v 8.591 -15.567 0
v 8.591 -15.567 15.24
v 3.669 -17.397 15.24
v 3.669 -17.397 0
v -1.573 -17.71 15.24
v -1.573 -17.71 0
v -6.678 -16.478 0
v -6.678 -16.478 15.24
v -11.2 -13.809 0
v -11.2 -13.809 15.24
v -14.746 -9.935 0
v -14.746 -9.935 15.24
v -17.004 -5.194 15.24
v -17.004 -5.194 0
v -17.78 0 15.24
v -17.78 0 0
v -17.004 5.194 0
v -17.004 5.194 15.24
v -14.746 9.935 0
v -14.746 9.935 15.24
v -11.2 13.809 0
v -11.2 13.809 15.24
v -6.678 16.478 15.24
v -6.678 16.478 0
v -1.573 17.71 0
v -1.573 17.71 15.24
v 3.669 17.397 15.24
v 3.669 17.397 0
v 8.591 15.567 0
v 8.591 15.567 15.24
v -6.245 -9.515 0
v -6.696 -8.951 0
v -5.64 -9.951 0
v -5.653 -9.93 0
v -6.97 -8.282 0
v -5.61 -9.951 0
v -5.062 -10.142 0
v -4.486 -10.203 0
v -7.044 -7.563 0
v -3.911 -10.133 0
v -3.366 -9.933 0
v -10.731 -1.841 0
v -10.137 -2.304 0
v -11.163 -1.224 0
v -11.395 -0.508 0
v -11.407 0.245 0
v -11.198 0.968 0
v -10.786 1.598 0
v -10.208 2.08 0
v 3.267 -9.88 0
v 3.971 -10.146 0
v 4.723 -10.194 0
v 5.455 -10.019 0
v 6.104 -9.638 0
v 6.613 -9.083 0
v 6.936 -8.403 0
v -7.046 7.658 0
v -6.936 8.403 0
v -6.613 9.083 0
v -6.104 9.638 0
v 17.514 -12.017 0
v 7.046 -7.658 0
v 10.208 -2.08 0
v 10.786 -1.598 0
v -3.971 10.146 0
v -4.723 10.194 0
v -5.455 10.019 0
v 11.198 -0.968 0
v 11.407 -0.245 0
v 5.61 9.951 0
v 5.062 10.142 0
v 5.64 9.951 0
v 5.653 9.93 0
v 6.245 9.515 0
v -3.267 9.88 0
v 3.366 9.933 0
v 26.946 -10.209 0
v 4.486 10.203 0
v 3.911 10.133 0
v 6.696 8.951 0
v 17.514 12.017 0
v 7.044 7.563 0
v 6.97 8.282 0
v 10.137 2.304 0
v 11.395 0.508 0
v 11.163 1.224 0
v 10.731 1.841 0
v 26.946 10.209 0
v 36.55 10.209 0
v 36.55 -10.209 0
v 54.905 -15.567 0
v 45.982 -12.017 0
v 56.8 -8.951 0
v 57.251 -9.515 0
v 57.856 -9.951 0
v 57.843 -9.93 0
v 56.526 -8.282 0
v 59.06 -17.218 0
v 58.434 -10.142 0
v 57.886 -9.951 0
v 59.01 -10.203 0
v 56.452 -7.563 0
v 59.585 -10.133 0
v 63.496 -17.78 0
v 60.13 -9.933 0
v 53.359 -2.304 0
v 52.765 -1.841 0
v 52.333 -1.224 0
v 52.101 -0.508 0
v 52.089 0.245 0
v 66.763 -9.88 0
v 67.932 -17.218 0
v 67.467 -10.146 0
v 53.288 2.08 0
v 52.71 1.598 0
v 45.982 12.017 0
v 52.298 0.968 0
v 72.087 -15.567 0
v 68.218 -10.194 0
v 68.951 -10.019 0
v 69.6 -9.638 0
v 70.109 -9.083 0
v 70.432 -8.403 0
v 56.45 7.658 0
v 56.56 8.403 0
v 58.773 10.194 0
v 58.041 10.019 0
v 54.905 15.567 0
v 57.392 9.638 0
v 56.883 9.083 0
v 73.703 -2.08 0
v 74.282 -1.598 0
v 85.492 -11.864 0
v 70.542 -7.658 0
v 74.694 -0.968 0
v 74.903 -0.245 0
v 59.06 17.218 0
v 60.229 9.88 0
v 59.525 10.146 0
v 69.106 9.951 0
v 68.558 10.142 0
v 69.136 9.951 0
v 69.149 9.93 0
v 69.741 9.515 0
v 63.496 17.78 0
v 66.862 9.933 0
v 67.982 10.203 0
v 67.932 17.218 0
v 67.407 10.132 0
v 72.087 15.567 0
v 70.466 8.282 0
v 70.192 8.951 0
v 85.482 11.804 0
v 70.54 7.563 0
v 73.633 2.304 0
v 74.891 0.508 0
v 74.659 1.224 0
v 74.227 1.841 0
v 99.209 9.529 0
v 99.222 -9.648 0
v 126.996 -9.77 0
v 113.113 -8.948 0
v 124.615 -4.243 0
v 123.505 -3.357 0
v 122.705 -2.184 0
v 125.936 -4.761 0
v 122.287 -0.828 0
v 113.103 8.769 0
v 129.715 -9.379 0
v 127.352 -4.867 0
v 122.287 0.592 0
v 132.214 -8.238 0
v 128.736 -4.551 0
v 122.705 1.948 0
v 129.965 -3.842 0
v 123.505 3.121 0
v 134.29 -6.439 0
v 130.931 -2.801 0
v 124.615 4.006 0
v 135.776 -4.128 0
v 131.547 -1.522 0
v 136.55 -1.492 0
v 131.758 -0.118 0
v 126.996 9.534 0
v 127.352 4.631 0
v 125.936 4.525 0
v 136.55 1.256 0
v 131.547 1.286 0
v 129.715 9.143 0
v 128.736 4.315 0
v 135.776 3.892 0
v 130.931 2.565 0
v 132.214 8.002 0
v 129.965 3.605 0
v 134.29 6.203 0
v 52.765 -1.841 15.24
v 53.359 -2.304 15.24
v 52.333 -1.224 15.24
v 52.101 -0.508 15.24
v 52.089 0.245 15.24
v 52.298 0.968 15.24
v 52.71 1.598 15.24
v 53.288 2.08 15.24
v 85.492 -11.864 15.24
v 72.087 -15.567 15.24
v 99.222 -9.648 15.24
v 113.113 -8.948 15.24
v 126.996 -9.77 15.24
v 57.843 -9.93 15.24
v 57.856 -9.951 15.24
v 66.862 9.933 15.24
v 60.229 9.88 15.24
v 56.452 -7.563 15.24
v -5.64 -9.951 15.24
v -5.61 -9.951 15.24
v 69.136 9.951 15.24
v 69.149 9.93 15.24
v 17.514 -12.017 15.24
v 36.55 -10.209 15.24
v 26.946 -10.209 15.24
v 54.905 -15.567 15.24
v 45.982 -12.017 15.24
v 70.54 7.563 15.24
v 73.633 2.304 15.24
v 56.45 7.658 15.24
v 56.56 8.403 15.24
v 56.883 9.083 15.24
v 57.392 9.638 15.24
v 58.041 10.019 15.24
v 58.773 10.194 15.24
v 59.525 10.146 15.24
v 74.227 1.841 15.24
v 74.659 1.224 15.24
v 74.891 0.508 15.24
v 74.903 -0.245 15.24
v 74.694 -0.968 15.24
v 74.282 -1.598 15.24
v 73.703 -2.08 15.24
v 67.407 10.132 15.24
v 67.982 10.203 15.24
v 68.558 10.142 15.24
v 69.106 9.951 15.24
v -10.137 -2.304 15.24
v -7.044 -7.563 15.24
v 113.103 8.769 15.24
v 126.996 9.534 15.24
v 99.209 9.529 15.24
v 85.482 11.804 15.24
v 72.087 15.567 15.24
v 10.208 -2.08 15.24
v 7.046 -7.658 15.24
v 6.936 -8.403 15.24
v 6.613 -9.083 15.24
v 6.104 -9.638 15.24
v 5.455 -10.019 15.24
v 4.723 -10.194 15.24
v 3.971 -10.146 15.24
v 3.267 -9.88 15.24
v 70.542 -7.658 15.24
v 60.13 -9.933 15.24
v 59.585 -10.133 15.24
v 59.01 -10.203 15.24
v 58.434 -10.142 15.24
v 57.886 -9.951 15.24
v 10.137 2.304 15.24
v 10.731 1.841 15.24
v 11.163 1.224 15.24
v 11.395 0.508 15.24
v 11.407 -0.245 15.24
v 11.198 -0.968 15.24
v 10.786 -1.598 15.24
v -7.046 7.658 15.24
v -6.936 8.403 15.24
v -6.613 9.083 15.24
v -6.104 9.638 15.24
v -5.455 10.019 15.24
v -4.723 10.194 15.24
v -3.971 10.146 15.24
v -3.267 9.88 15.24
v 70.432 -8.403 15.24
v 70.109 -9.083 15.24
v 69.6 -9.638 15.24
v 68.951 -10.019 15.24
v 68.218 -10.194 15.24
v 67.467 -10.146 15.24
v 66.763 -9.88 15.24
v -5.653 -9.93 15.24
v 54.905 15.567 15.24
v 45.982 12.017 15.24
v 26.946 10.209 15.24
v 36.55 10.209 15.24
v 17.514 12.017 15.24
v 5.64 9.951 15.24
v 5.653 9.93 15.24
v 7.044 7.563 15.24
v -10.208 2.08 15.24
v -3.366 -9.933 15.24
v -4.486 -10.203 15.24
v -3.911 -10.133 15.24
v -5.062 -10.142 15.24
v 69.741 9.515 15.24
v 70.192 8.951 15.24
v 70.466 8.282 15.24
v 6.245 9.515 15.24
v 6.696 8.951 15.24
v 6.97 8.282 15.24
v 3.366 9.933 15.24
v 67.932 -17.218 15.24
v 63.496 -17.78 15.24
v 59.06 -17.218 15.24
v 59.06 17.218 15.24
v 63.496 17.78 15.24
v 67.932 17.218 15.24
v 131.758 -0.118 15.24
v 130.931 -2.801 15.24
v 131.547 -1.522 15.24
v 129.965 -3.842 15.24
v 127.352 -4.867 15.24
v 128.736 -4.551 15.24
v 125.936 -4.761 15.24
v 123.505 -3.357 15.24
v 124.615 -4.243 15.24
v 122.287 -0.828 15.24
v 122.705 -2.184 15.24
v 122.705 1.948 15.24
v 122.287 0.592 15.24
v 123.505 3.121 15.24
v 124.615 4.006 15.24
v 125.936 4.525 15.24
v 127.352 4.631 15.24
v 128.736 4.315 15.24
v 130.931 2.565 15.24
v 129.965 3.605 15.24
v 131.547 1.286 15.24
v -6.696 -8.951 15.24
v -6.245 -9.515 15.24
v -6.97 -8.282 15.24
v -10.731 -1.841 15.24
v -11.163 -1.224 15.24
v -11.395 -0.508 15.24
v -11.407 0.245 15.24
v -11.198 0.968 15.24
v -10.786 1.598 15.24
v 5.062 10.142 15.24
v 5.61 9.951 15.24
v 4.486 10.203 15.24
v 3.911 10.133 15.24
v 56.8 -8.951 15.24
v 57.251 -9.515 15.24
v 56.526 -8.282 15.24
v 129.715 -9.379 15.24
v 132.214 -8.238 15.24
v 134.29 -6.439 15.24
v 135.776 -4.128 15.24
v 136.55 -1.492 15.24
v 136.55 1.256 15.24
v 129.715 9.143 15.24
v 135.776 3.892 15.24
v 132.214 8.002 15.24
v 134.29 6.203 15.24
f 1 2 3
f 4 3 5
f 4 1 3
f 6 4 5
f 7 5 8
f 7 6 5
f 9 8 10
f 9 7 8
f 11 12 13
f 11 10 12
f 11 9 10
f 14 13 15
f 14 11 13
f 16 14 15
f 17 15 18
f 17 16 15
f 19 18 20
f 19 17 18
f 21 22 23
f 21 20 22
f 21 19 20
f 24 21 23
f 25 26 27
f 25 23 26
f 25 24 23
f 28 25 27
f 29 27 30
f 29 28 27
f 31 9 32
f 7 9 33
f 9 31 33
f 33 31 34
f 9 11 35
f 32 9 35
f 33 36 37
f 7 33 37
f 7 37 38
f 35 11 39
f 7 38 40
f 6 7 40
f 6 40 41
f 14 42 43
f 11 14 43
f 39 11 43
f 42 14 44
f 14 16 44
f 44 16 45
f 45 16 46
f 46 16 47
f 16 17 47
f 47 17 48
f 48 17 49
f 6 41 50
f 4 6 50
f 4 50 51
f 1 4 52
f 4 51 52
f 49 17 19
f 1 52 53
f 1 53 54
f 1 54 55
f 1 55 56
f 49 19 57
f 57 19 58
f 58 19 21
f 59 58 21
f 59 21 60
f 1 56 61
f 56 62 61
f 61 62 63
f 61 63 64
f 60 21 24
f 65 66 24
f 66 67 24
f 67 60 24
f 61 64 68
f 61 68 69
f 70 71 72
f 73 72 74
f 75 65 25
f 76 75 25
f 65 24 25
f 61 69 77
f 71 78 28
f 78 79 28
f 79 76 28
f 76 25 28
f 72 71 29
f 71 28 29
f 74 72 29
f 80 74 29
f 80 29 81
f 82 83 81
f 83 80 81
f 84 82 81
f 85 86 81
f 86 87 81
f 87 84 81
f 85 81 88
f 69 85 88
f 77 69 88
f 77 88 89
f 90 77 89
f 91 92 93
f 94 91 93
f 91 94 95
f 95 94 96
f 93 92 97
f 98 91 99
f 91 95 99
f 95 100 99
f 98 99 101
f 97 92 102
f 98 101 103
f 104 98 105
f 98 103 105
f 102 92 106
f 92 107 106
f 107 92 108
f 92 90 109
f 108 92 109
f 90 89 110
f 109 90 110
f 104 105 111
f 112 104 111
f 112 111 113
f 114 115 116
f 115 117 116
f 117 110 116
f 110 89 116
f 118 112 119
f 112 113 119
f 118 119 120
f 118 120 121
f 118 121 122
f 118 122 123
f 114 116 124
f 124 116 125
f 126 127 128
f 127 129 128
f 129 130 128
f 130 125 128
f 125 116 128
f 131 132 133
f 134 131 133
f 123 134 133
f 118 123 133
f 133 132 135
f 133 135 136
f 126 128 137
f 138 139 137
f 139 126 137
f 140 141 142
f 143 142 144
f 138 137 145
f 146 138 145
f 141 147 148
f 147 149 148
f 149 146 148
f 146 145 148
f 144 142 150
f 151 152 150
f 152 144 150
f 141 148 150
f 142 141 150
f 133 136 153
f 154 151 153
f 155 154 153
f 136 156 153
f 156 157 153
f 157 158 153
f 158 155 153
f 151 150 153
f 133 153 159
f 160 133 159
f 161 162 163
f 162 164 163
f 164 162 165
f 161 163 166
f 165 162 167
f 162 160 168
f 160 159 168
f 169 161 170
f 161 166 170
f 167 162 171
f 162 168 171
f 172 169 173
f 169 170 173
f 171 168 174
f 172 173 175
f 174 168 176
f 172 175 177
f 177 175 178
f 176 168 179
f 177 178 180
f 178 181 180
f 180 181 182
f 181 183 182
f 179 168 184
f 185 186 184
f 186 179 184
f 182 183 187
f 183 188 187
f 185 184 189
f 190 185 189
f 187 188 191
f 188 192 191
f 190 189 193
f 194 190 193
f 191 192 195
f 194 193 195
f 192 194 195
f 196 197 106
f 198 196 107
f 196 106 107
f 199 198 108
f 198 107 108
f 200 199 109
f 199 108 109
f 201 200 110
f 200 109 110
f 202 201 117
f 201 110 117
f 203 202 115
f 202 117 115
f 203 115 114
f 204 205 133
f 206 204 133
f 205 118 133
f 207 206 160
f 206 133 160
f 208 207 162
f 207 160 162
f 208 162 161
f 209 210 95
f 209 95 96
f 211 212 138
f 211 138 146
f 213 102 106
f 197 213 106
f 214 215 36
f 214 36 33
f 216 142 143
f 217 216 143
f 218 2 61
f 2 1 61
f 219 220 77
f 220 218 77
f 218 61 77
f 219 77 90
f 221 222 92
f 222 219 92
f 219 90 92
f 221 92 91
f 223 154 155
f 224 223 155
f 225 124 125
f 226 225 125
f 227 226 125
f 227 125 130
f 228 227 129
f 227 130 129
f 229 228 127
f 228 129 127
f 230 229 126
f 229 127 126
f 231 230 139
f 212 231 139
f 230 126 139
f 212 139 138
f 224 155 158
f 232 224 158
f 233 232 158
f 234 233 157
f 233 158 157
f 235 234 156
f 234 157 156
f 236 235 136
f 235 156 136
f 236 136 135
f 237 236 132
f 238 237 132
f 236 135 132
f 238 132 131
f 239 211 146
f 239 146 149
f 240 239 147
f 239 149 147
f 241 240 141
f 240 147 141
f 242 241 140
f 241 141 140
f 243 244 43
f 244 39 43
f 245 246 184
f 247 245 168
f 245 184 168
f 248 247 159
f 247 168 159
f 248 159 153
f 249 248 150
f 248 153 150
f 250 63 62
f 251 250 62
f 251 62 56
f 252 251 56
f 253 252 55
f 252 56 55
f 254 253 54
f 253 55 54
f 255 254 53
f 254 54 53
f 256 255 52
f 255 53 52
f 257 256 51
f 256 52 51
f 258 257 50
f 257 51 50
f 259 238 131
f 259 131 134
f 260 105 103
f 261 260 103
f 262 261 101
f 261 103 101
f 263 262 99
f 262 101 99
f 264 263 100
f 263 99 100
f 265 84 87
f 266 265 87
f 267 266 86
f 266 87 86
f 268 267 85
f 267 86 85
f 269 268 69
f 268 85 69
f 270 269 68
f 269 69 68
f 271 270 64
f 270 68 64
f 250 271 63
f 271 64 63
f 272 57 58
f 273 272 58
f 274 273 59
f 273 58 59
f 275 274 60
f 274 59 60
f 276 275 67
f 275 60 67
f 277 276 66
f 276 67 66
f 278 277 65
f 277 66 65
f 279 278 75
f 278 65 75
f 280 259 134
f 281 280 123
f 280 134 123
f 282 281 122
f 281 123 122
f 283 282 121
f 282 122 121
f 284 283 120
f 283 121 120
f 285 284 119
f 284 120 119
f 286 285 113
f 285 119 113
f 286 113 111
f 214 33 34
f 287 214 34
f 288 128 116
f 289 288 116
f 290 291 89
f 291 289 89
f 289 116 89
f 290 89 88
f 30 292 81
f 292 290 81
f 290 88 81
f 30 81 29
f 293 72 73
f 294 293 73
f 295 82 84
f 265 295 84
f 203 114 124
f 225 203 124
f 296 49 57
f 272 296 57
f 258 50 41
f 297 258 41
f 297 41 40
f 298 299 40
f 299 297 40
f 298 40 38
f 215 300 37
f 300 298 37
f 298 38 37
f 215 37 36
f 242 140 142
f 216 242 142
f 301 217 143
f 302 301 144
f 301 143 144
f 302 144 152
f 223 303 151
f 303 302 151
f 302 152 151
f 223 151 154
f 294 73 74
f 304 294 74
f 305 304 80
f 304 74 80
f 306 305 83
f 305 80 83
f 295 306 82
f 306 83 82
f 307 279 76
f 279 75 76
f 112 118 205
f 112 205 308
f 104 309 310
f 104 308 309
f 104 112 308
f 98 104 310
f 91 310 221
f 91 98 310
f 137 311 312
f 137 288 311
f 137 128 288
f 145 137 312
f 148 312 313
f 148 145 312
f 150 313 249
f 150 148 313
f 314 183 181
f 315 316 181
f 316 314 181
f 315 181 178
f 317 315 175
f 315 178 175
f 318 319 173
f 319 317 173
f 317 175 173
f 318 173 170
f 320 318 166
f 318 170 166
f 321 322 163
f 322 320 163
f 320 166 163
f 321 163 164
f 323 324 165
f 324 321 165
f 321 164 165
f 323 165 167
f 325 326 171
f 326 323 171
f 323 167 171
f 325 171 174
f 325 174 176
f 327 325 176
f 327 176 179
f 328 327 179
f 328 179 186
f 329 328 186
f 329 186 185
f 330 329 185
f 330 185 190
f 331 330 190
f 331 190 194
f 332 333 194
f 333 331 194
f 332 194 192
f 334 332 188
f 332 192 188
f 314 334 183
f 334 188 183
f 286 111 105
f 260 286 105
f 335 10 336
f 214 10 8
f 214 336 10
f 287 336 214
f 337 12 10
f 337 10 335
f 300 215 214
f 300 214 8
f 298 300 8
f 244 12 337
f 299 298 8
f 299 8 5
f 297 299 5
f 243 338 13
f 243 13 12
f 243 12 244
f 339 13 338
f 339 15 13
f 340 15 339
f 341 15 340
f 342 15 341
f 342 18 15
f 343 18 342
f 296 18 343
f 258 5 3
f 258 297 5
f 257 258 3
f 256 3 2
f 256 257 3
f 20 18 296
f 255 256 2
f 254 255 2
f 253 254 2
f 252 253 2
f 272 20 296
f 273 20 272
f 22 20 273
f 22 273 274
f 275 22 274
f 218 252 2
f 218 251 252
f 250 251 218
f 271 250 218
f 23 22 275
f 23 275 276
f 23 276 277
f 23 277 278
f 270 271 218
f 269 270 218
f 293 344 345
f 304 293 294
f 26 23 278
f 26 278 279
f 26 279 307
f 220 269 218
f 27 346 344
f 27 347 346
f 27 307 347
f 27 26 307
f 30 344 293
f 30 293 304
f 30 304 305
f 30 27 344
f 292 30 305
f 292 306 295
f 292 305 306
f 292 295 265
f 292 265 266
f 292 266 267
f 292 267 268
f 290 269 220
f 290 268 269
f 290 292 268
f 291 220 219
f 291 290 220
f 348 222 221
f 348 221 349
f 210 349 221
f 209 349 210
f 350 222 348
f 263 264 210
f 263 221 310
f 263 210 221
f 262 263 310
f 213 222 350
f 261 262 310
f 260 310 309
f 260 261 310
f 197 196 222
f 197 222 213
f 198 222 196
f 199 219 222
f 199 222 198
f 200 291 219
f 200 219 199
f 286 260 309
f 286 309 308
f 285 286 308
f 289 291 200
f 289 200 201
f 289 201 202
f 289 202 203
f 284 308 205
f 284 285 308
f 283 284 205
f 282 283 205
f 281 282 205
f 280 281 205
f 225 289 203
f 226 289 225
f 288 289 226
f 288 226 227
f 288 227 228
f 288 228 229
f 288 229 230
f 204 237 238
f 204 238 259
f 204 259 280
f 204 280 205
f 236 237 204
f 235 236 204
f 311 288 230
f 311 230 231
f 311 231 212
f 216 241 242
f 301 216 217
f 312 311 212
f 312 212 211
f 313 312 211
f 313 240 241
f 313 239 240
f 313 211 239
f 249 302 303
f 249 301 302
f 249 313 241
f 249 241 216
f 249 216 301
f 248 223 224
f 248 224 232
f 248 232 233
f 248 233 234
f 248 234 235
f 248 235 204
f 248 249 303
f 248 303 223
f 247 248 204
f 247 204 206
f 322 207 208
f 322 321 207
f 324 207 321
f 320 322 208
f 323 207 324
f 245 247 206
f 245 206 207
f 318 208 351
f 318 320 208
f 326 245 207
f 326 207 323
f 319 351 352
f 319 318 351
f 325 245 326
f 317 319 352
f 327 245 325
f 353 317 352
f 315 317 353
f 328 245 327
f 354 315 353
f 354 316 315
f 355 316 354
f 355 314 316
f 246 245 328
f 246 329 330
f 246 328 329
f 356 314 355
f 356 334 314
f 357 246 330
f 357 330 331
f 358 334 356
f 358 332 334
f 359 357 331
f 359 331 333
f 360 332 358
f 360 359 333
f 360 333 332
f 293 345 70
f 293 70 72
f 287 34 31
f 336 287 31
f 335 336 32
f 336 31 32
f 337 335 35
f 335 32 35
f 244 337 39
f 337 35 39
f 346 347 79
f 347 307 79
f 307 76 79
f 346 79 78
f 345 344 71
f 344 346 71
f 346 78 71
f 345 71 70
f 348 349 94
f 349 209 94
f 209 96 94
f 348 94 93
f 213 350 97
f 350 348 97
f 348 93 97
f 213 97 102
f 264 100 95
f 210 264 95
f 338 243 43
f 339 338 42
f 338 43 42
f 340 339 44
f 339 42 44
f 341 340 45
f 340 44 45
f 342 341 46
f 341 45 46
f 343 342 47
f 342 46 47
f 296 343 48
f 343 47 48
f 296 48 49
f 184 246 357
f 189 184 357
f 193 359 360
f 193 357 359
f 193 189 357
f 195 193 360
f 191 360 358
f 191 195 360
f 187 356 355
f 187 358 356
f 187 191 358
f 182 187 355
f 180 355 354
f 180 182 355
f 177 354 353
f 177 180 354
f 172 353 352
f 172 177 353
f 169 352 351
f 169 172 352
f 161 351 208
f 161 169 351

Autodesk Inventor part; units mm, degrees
ref_plane "YZ Plane" through (0, 0, 0) normal (1, 0, 0) x (0, 1, 0)
ref_plane "XZ Plane" through (0, 0, 0) normal (0, 1, 0) x (-1, 0, 0)
ref_plane "XY Plane" through (0, 0, 0) normal (0, 0, 1) x (1, 0, 0)
sketch "Sketch1" plane through (0, 0, 0) normal (0, 0, 1) x (1, 0, 0)
  line L0 (-11.4295, -0.0912) -> (-11.4381, -0.0912)
  line L1 (-5.798, 9.8601) -> (-5.7937, 9.8528)
  line L2 (5.6401, 9.9513) -> (5.6341, 9.9392)
  line L3 (11.4381, 0.0912) -> (11.4295, 0.0912)
  line L4 (5.798, -9.8601) -> (5.7937, -9.8528)
  line L5 (-5.6401, -9.9513) -> (-5.6341, -9.9392)
  arc A0 (-3.2667, 9.8803) -> (-7.0462, 7.6578) centre (-4.5062, 7.6633) ccw
  arc A1 (7.0443, 7.5633) -> (3.3664, 9.9332) centre (4.5062, 7.6633) ccw
  arc A2 (10.2075, -2.0801) -> (10.1371, 2.3037) centre (8.8895, 0.0912) ccw
  arc A3 (3.2667, -9.8803) -> (7.0462, -7.6578) centre (4.5062, -7.6633) ccw
  arc A4 (-7.0443, -7.5633) -> (-3.3664, -9.9332) centre (-4.5062, -7.6633) ccw
  arc A5 (-10.2075, 2.0801) -> (-10.1371, -2.3037) centre (-8.8895, -0.0912) ccw
  line L6 (-11.4295, -0.1058) -> (-11.4381, -0.0912)
  line L7 (-11.4381, -0.0912) -> (-11.4295, -0.076)
  line L8 (-10.2075, 2.0801) -> (-7.0462, 7.6578)
  line L9 (-5.8064, 9.8453) -> (-5.798, 9.8601)
  line L10 (-5.798, 9.8601) -> (-5.781, 9.8602)
  line L11 (5.6401, 9.9513) -> (5.6527, 9.9298)
  line L12 (-3.2667, 9.8803) -> (3.3664, 9.9332)
  line L13 (5.6098, 9.951) -> (5.6401, 9.9513)
  line L14 (7.0443, 7.5633) -> (10.1371, 2.3037)
  line L15 (11.4295, 0.1058) -> (11.4381, 0.0912)
  line L16 (11.4381, 0.0912) -> (11.4295, 0.076)
  line L17 (10.2075, -2.0801) -> (7.0462, -7.6578)
  line L18 (5.8064, -9.8453) -> (5.798, -9.8601)
  line L19 (5.798, -9.8601) -> (5.781, -9.8602)
  line L20 (-5.6401, -9.9513) -> (-5.6527, -9.9298)
  line L21 (-7.0443, -7.5633) -> (-10.1371, -2.3037)
  line L22 (3.2667, -9.8803) -> (-3.3664, -9.9332)
  line L23 (-5.6098, -9.951) -> (-5.6401, -9.9513)
  arc A6 (8.5907, 15.5669) -> (8.5907, -15.5669) centre (0, 0) ccw
  line L24 (52.0664, -0.0912) -> (52.0579, -0.0912)
  line L25 (57.6979, 9.8601) -> (57.7022, 9.8528)
  line L26 (69.136, 9.9513) -> (69.13, 9.9392)
  line L27 (74.9341, 0.0912) -> (74.9255, 0.0912)
  line L28 (69.294, -9.8601) -> (69.2897, -9.8528)
  line L29 (57.8559, -9.9513) -> (57.8619, -9.9392)
  arc A7 (60.2293, 9.8803) -> (56.4497, 7.6578) centre (58.9897, 7.6633) ccw
  arc A8 (70.5402, 7.5633) -> (66.8624, 9.9332) centre (68.0022, 7.6633) ccw
  arc A9 (73.7034, -2.0801) -> (73.633, 2.3037) centre (72.3855, 0.0912) ccw
  arc A10 (66.7626, -9.8803) -> (70.5422, -7.6578) centre (68.0022, -7.6633) ccw
  arc A11 (56.4517, -7.5633) -> (60.1296, -9.9332) centre (58.9897, -7.6633) ccw
  arc A12 (53.2885, 2.0801) -> (53.3589, -2.3037) centre (54.6064, -0.0912) ccw
  line L30 (52.0665, -0.1058) -> (52.0579, -0.0912)
  line L31 (52.0579, -0.0912) -> (52.0665, -0.076)
  line L32 (53.2885, 2.0801) -> (56.4497, 7.6578)
  line L33 (57.6895, 9.8453) -> (57.6979, 9.8601)
  line L34 (57.6979, 9.8601) -> (57.7149, 9.8602)
  line L35 (69.136, 9.9513) -> (69.1486, 9.9298)
  line L36 (60.2293, 9.8803) -> (66.8624, 9.9332)
  line L37 (69.1057, 9.951) -> (69.136, 9.9513)
  line L38 (70.5402, 7.5633) -> (73.633, 2.3037)
  line L39 (74.9255, 0.1058) -> (74.9341, 0.0912)
  line L40 (74.9341, 0.0912) -> (74.9254, 0.076)
  line L41 (73.7034, -2.0801) -> (70.5422, -7.6578)
  line L42 (69.3024, -9.8453) -> (69.294, -9.8601)
  line L43 (69.294, -9.8601) -> (69.277, -9.8602)
  line L44 (57.8559, -9.9513) -> (57.8433, -9.9298)
  line L45 (56.4517, -7.5633) -> (53.3589, -2.3037)
  line L46 (66.7626, -9.8803) -> (60.1296, -9.9332)
  line L47 (57.8862, -9.951) -> (57.8559, -9.9513)
  circle A13 centre (126.996, -0.1181) radius 4.7625
  arc A14 (124.9667, -9.5543) -> (125.0395, 9.3336) centre (126.996, -0.1181) ccw
  arc A15 (72.0866, 15.5669) -> (126.996, 9.5339) centre (113.0796, 135.7692) ccw
  arc A16 (126.996, -9.7701) -> (72.0866, -15.5669) centre (112.5559, -135.9465) ccw
  arc A17 (54.9053, -15.5669) -> (8.5907, -15.5669) centre (31.748, -60.7817) ccw
  arc A18 (8.5907, 15.5669) -> (54.9053, 15.5669) centre (31.748, 60.7817) ccw
  arc A19 (54.9053, -15.5669) -> (72.0866, -15.5669) centre (63.496, 0) ccw
  arc A20 (72.0866, 15.5669) -> (54.9053, 15.5669) centre (63.496, 0) ccw
  dimension "d19" = 9.525
  dimension "d21" = 19.304
  dimension "d22" = 127
  dimension "d23" = 127
  dimension "d24" = 50.8
  dimension "d25" = 50.8
extrude "Extrusion1" add sketch "Sketch1" along normal blind 15.24 contours A5 L6 L0 | L0 L7 A5 | L9 L1 A0 | L1 L10 A0 | A3 L4 L19 | A3 L18 L4 | L15 L3 A2 | A2 L3 L16 | A18 A20 A15 A14 A16 A19 A17 A6 | A12 L30 L24 | L24 L31 A12 | L33 L25 A7 | L25 L34 A7 | A10 L28 L43 | A10 L42 L28 | L39 L27 A9 | A9 L27 L40
properties part number "JB_CAD_FinalPt1"
